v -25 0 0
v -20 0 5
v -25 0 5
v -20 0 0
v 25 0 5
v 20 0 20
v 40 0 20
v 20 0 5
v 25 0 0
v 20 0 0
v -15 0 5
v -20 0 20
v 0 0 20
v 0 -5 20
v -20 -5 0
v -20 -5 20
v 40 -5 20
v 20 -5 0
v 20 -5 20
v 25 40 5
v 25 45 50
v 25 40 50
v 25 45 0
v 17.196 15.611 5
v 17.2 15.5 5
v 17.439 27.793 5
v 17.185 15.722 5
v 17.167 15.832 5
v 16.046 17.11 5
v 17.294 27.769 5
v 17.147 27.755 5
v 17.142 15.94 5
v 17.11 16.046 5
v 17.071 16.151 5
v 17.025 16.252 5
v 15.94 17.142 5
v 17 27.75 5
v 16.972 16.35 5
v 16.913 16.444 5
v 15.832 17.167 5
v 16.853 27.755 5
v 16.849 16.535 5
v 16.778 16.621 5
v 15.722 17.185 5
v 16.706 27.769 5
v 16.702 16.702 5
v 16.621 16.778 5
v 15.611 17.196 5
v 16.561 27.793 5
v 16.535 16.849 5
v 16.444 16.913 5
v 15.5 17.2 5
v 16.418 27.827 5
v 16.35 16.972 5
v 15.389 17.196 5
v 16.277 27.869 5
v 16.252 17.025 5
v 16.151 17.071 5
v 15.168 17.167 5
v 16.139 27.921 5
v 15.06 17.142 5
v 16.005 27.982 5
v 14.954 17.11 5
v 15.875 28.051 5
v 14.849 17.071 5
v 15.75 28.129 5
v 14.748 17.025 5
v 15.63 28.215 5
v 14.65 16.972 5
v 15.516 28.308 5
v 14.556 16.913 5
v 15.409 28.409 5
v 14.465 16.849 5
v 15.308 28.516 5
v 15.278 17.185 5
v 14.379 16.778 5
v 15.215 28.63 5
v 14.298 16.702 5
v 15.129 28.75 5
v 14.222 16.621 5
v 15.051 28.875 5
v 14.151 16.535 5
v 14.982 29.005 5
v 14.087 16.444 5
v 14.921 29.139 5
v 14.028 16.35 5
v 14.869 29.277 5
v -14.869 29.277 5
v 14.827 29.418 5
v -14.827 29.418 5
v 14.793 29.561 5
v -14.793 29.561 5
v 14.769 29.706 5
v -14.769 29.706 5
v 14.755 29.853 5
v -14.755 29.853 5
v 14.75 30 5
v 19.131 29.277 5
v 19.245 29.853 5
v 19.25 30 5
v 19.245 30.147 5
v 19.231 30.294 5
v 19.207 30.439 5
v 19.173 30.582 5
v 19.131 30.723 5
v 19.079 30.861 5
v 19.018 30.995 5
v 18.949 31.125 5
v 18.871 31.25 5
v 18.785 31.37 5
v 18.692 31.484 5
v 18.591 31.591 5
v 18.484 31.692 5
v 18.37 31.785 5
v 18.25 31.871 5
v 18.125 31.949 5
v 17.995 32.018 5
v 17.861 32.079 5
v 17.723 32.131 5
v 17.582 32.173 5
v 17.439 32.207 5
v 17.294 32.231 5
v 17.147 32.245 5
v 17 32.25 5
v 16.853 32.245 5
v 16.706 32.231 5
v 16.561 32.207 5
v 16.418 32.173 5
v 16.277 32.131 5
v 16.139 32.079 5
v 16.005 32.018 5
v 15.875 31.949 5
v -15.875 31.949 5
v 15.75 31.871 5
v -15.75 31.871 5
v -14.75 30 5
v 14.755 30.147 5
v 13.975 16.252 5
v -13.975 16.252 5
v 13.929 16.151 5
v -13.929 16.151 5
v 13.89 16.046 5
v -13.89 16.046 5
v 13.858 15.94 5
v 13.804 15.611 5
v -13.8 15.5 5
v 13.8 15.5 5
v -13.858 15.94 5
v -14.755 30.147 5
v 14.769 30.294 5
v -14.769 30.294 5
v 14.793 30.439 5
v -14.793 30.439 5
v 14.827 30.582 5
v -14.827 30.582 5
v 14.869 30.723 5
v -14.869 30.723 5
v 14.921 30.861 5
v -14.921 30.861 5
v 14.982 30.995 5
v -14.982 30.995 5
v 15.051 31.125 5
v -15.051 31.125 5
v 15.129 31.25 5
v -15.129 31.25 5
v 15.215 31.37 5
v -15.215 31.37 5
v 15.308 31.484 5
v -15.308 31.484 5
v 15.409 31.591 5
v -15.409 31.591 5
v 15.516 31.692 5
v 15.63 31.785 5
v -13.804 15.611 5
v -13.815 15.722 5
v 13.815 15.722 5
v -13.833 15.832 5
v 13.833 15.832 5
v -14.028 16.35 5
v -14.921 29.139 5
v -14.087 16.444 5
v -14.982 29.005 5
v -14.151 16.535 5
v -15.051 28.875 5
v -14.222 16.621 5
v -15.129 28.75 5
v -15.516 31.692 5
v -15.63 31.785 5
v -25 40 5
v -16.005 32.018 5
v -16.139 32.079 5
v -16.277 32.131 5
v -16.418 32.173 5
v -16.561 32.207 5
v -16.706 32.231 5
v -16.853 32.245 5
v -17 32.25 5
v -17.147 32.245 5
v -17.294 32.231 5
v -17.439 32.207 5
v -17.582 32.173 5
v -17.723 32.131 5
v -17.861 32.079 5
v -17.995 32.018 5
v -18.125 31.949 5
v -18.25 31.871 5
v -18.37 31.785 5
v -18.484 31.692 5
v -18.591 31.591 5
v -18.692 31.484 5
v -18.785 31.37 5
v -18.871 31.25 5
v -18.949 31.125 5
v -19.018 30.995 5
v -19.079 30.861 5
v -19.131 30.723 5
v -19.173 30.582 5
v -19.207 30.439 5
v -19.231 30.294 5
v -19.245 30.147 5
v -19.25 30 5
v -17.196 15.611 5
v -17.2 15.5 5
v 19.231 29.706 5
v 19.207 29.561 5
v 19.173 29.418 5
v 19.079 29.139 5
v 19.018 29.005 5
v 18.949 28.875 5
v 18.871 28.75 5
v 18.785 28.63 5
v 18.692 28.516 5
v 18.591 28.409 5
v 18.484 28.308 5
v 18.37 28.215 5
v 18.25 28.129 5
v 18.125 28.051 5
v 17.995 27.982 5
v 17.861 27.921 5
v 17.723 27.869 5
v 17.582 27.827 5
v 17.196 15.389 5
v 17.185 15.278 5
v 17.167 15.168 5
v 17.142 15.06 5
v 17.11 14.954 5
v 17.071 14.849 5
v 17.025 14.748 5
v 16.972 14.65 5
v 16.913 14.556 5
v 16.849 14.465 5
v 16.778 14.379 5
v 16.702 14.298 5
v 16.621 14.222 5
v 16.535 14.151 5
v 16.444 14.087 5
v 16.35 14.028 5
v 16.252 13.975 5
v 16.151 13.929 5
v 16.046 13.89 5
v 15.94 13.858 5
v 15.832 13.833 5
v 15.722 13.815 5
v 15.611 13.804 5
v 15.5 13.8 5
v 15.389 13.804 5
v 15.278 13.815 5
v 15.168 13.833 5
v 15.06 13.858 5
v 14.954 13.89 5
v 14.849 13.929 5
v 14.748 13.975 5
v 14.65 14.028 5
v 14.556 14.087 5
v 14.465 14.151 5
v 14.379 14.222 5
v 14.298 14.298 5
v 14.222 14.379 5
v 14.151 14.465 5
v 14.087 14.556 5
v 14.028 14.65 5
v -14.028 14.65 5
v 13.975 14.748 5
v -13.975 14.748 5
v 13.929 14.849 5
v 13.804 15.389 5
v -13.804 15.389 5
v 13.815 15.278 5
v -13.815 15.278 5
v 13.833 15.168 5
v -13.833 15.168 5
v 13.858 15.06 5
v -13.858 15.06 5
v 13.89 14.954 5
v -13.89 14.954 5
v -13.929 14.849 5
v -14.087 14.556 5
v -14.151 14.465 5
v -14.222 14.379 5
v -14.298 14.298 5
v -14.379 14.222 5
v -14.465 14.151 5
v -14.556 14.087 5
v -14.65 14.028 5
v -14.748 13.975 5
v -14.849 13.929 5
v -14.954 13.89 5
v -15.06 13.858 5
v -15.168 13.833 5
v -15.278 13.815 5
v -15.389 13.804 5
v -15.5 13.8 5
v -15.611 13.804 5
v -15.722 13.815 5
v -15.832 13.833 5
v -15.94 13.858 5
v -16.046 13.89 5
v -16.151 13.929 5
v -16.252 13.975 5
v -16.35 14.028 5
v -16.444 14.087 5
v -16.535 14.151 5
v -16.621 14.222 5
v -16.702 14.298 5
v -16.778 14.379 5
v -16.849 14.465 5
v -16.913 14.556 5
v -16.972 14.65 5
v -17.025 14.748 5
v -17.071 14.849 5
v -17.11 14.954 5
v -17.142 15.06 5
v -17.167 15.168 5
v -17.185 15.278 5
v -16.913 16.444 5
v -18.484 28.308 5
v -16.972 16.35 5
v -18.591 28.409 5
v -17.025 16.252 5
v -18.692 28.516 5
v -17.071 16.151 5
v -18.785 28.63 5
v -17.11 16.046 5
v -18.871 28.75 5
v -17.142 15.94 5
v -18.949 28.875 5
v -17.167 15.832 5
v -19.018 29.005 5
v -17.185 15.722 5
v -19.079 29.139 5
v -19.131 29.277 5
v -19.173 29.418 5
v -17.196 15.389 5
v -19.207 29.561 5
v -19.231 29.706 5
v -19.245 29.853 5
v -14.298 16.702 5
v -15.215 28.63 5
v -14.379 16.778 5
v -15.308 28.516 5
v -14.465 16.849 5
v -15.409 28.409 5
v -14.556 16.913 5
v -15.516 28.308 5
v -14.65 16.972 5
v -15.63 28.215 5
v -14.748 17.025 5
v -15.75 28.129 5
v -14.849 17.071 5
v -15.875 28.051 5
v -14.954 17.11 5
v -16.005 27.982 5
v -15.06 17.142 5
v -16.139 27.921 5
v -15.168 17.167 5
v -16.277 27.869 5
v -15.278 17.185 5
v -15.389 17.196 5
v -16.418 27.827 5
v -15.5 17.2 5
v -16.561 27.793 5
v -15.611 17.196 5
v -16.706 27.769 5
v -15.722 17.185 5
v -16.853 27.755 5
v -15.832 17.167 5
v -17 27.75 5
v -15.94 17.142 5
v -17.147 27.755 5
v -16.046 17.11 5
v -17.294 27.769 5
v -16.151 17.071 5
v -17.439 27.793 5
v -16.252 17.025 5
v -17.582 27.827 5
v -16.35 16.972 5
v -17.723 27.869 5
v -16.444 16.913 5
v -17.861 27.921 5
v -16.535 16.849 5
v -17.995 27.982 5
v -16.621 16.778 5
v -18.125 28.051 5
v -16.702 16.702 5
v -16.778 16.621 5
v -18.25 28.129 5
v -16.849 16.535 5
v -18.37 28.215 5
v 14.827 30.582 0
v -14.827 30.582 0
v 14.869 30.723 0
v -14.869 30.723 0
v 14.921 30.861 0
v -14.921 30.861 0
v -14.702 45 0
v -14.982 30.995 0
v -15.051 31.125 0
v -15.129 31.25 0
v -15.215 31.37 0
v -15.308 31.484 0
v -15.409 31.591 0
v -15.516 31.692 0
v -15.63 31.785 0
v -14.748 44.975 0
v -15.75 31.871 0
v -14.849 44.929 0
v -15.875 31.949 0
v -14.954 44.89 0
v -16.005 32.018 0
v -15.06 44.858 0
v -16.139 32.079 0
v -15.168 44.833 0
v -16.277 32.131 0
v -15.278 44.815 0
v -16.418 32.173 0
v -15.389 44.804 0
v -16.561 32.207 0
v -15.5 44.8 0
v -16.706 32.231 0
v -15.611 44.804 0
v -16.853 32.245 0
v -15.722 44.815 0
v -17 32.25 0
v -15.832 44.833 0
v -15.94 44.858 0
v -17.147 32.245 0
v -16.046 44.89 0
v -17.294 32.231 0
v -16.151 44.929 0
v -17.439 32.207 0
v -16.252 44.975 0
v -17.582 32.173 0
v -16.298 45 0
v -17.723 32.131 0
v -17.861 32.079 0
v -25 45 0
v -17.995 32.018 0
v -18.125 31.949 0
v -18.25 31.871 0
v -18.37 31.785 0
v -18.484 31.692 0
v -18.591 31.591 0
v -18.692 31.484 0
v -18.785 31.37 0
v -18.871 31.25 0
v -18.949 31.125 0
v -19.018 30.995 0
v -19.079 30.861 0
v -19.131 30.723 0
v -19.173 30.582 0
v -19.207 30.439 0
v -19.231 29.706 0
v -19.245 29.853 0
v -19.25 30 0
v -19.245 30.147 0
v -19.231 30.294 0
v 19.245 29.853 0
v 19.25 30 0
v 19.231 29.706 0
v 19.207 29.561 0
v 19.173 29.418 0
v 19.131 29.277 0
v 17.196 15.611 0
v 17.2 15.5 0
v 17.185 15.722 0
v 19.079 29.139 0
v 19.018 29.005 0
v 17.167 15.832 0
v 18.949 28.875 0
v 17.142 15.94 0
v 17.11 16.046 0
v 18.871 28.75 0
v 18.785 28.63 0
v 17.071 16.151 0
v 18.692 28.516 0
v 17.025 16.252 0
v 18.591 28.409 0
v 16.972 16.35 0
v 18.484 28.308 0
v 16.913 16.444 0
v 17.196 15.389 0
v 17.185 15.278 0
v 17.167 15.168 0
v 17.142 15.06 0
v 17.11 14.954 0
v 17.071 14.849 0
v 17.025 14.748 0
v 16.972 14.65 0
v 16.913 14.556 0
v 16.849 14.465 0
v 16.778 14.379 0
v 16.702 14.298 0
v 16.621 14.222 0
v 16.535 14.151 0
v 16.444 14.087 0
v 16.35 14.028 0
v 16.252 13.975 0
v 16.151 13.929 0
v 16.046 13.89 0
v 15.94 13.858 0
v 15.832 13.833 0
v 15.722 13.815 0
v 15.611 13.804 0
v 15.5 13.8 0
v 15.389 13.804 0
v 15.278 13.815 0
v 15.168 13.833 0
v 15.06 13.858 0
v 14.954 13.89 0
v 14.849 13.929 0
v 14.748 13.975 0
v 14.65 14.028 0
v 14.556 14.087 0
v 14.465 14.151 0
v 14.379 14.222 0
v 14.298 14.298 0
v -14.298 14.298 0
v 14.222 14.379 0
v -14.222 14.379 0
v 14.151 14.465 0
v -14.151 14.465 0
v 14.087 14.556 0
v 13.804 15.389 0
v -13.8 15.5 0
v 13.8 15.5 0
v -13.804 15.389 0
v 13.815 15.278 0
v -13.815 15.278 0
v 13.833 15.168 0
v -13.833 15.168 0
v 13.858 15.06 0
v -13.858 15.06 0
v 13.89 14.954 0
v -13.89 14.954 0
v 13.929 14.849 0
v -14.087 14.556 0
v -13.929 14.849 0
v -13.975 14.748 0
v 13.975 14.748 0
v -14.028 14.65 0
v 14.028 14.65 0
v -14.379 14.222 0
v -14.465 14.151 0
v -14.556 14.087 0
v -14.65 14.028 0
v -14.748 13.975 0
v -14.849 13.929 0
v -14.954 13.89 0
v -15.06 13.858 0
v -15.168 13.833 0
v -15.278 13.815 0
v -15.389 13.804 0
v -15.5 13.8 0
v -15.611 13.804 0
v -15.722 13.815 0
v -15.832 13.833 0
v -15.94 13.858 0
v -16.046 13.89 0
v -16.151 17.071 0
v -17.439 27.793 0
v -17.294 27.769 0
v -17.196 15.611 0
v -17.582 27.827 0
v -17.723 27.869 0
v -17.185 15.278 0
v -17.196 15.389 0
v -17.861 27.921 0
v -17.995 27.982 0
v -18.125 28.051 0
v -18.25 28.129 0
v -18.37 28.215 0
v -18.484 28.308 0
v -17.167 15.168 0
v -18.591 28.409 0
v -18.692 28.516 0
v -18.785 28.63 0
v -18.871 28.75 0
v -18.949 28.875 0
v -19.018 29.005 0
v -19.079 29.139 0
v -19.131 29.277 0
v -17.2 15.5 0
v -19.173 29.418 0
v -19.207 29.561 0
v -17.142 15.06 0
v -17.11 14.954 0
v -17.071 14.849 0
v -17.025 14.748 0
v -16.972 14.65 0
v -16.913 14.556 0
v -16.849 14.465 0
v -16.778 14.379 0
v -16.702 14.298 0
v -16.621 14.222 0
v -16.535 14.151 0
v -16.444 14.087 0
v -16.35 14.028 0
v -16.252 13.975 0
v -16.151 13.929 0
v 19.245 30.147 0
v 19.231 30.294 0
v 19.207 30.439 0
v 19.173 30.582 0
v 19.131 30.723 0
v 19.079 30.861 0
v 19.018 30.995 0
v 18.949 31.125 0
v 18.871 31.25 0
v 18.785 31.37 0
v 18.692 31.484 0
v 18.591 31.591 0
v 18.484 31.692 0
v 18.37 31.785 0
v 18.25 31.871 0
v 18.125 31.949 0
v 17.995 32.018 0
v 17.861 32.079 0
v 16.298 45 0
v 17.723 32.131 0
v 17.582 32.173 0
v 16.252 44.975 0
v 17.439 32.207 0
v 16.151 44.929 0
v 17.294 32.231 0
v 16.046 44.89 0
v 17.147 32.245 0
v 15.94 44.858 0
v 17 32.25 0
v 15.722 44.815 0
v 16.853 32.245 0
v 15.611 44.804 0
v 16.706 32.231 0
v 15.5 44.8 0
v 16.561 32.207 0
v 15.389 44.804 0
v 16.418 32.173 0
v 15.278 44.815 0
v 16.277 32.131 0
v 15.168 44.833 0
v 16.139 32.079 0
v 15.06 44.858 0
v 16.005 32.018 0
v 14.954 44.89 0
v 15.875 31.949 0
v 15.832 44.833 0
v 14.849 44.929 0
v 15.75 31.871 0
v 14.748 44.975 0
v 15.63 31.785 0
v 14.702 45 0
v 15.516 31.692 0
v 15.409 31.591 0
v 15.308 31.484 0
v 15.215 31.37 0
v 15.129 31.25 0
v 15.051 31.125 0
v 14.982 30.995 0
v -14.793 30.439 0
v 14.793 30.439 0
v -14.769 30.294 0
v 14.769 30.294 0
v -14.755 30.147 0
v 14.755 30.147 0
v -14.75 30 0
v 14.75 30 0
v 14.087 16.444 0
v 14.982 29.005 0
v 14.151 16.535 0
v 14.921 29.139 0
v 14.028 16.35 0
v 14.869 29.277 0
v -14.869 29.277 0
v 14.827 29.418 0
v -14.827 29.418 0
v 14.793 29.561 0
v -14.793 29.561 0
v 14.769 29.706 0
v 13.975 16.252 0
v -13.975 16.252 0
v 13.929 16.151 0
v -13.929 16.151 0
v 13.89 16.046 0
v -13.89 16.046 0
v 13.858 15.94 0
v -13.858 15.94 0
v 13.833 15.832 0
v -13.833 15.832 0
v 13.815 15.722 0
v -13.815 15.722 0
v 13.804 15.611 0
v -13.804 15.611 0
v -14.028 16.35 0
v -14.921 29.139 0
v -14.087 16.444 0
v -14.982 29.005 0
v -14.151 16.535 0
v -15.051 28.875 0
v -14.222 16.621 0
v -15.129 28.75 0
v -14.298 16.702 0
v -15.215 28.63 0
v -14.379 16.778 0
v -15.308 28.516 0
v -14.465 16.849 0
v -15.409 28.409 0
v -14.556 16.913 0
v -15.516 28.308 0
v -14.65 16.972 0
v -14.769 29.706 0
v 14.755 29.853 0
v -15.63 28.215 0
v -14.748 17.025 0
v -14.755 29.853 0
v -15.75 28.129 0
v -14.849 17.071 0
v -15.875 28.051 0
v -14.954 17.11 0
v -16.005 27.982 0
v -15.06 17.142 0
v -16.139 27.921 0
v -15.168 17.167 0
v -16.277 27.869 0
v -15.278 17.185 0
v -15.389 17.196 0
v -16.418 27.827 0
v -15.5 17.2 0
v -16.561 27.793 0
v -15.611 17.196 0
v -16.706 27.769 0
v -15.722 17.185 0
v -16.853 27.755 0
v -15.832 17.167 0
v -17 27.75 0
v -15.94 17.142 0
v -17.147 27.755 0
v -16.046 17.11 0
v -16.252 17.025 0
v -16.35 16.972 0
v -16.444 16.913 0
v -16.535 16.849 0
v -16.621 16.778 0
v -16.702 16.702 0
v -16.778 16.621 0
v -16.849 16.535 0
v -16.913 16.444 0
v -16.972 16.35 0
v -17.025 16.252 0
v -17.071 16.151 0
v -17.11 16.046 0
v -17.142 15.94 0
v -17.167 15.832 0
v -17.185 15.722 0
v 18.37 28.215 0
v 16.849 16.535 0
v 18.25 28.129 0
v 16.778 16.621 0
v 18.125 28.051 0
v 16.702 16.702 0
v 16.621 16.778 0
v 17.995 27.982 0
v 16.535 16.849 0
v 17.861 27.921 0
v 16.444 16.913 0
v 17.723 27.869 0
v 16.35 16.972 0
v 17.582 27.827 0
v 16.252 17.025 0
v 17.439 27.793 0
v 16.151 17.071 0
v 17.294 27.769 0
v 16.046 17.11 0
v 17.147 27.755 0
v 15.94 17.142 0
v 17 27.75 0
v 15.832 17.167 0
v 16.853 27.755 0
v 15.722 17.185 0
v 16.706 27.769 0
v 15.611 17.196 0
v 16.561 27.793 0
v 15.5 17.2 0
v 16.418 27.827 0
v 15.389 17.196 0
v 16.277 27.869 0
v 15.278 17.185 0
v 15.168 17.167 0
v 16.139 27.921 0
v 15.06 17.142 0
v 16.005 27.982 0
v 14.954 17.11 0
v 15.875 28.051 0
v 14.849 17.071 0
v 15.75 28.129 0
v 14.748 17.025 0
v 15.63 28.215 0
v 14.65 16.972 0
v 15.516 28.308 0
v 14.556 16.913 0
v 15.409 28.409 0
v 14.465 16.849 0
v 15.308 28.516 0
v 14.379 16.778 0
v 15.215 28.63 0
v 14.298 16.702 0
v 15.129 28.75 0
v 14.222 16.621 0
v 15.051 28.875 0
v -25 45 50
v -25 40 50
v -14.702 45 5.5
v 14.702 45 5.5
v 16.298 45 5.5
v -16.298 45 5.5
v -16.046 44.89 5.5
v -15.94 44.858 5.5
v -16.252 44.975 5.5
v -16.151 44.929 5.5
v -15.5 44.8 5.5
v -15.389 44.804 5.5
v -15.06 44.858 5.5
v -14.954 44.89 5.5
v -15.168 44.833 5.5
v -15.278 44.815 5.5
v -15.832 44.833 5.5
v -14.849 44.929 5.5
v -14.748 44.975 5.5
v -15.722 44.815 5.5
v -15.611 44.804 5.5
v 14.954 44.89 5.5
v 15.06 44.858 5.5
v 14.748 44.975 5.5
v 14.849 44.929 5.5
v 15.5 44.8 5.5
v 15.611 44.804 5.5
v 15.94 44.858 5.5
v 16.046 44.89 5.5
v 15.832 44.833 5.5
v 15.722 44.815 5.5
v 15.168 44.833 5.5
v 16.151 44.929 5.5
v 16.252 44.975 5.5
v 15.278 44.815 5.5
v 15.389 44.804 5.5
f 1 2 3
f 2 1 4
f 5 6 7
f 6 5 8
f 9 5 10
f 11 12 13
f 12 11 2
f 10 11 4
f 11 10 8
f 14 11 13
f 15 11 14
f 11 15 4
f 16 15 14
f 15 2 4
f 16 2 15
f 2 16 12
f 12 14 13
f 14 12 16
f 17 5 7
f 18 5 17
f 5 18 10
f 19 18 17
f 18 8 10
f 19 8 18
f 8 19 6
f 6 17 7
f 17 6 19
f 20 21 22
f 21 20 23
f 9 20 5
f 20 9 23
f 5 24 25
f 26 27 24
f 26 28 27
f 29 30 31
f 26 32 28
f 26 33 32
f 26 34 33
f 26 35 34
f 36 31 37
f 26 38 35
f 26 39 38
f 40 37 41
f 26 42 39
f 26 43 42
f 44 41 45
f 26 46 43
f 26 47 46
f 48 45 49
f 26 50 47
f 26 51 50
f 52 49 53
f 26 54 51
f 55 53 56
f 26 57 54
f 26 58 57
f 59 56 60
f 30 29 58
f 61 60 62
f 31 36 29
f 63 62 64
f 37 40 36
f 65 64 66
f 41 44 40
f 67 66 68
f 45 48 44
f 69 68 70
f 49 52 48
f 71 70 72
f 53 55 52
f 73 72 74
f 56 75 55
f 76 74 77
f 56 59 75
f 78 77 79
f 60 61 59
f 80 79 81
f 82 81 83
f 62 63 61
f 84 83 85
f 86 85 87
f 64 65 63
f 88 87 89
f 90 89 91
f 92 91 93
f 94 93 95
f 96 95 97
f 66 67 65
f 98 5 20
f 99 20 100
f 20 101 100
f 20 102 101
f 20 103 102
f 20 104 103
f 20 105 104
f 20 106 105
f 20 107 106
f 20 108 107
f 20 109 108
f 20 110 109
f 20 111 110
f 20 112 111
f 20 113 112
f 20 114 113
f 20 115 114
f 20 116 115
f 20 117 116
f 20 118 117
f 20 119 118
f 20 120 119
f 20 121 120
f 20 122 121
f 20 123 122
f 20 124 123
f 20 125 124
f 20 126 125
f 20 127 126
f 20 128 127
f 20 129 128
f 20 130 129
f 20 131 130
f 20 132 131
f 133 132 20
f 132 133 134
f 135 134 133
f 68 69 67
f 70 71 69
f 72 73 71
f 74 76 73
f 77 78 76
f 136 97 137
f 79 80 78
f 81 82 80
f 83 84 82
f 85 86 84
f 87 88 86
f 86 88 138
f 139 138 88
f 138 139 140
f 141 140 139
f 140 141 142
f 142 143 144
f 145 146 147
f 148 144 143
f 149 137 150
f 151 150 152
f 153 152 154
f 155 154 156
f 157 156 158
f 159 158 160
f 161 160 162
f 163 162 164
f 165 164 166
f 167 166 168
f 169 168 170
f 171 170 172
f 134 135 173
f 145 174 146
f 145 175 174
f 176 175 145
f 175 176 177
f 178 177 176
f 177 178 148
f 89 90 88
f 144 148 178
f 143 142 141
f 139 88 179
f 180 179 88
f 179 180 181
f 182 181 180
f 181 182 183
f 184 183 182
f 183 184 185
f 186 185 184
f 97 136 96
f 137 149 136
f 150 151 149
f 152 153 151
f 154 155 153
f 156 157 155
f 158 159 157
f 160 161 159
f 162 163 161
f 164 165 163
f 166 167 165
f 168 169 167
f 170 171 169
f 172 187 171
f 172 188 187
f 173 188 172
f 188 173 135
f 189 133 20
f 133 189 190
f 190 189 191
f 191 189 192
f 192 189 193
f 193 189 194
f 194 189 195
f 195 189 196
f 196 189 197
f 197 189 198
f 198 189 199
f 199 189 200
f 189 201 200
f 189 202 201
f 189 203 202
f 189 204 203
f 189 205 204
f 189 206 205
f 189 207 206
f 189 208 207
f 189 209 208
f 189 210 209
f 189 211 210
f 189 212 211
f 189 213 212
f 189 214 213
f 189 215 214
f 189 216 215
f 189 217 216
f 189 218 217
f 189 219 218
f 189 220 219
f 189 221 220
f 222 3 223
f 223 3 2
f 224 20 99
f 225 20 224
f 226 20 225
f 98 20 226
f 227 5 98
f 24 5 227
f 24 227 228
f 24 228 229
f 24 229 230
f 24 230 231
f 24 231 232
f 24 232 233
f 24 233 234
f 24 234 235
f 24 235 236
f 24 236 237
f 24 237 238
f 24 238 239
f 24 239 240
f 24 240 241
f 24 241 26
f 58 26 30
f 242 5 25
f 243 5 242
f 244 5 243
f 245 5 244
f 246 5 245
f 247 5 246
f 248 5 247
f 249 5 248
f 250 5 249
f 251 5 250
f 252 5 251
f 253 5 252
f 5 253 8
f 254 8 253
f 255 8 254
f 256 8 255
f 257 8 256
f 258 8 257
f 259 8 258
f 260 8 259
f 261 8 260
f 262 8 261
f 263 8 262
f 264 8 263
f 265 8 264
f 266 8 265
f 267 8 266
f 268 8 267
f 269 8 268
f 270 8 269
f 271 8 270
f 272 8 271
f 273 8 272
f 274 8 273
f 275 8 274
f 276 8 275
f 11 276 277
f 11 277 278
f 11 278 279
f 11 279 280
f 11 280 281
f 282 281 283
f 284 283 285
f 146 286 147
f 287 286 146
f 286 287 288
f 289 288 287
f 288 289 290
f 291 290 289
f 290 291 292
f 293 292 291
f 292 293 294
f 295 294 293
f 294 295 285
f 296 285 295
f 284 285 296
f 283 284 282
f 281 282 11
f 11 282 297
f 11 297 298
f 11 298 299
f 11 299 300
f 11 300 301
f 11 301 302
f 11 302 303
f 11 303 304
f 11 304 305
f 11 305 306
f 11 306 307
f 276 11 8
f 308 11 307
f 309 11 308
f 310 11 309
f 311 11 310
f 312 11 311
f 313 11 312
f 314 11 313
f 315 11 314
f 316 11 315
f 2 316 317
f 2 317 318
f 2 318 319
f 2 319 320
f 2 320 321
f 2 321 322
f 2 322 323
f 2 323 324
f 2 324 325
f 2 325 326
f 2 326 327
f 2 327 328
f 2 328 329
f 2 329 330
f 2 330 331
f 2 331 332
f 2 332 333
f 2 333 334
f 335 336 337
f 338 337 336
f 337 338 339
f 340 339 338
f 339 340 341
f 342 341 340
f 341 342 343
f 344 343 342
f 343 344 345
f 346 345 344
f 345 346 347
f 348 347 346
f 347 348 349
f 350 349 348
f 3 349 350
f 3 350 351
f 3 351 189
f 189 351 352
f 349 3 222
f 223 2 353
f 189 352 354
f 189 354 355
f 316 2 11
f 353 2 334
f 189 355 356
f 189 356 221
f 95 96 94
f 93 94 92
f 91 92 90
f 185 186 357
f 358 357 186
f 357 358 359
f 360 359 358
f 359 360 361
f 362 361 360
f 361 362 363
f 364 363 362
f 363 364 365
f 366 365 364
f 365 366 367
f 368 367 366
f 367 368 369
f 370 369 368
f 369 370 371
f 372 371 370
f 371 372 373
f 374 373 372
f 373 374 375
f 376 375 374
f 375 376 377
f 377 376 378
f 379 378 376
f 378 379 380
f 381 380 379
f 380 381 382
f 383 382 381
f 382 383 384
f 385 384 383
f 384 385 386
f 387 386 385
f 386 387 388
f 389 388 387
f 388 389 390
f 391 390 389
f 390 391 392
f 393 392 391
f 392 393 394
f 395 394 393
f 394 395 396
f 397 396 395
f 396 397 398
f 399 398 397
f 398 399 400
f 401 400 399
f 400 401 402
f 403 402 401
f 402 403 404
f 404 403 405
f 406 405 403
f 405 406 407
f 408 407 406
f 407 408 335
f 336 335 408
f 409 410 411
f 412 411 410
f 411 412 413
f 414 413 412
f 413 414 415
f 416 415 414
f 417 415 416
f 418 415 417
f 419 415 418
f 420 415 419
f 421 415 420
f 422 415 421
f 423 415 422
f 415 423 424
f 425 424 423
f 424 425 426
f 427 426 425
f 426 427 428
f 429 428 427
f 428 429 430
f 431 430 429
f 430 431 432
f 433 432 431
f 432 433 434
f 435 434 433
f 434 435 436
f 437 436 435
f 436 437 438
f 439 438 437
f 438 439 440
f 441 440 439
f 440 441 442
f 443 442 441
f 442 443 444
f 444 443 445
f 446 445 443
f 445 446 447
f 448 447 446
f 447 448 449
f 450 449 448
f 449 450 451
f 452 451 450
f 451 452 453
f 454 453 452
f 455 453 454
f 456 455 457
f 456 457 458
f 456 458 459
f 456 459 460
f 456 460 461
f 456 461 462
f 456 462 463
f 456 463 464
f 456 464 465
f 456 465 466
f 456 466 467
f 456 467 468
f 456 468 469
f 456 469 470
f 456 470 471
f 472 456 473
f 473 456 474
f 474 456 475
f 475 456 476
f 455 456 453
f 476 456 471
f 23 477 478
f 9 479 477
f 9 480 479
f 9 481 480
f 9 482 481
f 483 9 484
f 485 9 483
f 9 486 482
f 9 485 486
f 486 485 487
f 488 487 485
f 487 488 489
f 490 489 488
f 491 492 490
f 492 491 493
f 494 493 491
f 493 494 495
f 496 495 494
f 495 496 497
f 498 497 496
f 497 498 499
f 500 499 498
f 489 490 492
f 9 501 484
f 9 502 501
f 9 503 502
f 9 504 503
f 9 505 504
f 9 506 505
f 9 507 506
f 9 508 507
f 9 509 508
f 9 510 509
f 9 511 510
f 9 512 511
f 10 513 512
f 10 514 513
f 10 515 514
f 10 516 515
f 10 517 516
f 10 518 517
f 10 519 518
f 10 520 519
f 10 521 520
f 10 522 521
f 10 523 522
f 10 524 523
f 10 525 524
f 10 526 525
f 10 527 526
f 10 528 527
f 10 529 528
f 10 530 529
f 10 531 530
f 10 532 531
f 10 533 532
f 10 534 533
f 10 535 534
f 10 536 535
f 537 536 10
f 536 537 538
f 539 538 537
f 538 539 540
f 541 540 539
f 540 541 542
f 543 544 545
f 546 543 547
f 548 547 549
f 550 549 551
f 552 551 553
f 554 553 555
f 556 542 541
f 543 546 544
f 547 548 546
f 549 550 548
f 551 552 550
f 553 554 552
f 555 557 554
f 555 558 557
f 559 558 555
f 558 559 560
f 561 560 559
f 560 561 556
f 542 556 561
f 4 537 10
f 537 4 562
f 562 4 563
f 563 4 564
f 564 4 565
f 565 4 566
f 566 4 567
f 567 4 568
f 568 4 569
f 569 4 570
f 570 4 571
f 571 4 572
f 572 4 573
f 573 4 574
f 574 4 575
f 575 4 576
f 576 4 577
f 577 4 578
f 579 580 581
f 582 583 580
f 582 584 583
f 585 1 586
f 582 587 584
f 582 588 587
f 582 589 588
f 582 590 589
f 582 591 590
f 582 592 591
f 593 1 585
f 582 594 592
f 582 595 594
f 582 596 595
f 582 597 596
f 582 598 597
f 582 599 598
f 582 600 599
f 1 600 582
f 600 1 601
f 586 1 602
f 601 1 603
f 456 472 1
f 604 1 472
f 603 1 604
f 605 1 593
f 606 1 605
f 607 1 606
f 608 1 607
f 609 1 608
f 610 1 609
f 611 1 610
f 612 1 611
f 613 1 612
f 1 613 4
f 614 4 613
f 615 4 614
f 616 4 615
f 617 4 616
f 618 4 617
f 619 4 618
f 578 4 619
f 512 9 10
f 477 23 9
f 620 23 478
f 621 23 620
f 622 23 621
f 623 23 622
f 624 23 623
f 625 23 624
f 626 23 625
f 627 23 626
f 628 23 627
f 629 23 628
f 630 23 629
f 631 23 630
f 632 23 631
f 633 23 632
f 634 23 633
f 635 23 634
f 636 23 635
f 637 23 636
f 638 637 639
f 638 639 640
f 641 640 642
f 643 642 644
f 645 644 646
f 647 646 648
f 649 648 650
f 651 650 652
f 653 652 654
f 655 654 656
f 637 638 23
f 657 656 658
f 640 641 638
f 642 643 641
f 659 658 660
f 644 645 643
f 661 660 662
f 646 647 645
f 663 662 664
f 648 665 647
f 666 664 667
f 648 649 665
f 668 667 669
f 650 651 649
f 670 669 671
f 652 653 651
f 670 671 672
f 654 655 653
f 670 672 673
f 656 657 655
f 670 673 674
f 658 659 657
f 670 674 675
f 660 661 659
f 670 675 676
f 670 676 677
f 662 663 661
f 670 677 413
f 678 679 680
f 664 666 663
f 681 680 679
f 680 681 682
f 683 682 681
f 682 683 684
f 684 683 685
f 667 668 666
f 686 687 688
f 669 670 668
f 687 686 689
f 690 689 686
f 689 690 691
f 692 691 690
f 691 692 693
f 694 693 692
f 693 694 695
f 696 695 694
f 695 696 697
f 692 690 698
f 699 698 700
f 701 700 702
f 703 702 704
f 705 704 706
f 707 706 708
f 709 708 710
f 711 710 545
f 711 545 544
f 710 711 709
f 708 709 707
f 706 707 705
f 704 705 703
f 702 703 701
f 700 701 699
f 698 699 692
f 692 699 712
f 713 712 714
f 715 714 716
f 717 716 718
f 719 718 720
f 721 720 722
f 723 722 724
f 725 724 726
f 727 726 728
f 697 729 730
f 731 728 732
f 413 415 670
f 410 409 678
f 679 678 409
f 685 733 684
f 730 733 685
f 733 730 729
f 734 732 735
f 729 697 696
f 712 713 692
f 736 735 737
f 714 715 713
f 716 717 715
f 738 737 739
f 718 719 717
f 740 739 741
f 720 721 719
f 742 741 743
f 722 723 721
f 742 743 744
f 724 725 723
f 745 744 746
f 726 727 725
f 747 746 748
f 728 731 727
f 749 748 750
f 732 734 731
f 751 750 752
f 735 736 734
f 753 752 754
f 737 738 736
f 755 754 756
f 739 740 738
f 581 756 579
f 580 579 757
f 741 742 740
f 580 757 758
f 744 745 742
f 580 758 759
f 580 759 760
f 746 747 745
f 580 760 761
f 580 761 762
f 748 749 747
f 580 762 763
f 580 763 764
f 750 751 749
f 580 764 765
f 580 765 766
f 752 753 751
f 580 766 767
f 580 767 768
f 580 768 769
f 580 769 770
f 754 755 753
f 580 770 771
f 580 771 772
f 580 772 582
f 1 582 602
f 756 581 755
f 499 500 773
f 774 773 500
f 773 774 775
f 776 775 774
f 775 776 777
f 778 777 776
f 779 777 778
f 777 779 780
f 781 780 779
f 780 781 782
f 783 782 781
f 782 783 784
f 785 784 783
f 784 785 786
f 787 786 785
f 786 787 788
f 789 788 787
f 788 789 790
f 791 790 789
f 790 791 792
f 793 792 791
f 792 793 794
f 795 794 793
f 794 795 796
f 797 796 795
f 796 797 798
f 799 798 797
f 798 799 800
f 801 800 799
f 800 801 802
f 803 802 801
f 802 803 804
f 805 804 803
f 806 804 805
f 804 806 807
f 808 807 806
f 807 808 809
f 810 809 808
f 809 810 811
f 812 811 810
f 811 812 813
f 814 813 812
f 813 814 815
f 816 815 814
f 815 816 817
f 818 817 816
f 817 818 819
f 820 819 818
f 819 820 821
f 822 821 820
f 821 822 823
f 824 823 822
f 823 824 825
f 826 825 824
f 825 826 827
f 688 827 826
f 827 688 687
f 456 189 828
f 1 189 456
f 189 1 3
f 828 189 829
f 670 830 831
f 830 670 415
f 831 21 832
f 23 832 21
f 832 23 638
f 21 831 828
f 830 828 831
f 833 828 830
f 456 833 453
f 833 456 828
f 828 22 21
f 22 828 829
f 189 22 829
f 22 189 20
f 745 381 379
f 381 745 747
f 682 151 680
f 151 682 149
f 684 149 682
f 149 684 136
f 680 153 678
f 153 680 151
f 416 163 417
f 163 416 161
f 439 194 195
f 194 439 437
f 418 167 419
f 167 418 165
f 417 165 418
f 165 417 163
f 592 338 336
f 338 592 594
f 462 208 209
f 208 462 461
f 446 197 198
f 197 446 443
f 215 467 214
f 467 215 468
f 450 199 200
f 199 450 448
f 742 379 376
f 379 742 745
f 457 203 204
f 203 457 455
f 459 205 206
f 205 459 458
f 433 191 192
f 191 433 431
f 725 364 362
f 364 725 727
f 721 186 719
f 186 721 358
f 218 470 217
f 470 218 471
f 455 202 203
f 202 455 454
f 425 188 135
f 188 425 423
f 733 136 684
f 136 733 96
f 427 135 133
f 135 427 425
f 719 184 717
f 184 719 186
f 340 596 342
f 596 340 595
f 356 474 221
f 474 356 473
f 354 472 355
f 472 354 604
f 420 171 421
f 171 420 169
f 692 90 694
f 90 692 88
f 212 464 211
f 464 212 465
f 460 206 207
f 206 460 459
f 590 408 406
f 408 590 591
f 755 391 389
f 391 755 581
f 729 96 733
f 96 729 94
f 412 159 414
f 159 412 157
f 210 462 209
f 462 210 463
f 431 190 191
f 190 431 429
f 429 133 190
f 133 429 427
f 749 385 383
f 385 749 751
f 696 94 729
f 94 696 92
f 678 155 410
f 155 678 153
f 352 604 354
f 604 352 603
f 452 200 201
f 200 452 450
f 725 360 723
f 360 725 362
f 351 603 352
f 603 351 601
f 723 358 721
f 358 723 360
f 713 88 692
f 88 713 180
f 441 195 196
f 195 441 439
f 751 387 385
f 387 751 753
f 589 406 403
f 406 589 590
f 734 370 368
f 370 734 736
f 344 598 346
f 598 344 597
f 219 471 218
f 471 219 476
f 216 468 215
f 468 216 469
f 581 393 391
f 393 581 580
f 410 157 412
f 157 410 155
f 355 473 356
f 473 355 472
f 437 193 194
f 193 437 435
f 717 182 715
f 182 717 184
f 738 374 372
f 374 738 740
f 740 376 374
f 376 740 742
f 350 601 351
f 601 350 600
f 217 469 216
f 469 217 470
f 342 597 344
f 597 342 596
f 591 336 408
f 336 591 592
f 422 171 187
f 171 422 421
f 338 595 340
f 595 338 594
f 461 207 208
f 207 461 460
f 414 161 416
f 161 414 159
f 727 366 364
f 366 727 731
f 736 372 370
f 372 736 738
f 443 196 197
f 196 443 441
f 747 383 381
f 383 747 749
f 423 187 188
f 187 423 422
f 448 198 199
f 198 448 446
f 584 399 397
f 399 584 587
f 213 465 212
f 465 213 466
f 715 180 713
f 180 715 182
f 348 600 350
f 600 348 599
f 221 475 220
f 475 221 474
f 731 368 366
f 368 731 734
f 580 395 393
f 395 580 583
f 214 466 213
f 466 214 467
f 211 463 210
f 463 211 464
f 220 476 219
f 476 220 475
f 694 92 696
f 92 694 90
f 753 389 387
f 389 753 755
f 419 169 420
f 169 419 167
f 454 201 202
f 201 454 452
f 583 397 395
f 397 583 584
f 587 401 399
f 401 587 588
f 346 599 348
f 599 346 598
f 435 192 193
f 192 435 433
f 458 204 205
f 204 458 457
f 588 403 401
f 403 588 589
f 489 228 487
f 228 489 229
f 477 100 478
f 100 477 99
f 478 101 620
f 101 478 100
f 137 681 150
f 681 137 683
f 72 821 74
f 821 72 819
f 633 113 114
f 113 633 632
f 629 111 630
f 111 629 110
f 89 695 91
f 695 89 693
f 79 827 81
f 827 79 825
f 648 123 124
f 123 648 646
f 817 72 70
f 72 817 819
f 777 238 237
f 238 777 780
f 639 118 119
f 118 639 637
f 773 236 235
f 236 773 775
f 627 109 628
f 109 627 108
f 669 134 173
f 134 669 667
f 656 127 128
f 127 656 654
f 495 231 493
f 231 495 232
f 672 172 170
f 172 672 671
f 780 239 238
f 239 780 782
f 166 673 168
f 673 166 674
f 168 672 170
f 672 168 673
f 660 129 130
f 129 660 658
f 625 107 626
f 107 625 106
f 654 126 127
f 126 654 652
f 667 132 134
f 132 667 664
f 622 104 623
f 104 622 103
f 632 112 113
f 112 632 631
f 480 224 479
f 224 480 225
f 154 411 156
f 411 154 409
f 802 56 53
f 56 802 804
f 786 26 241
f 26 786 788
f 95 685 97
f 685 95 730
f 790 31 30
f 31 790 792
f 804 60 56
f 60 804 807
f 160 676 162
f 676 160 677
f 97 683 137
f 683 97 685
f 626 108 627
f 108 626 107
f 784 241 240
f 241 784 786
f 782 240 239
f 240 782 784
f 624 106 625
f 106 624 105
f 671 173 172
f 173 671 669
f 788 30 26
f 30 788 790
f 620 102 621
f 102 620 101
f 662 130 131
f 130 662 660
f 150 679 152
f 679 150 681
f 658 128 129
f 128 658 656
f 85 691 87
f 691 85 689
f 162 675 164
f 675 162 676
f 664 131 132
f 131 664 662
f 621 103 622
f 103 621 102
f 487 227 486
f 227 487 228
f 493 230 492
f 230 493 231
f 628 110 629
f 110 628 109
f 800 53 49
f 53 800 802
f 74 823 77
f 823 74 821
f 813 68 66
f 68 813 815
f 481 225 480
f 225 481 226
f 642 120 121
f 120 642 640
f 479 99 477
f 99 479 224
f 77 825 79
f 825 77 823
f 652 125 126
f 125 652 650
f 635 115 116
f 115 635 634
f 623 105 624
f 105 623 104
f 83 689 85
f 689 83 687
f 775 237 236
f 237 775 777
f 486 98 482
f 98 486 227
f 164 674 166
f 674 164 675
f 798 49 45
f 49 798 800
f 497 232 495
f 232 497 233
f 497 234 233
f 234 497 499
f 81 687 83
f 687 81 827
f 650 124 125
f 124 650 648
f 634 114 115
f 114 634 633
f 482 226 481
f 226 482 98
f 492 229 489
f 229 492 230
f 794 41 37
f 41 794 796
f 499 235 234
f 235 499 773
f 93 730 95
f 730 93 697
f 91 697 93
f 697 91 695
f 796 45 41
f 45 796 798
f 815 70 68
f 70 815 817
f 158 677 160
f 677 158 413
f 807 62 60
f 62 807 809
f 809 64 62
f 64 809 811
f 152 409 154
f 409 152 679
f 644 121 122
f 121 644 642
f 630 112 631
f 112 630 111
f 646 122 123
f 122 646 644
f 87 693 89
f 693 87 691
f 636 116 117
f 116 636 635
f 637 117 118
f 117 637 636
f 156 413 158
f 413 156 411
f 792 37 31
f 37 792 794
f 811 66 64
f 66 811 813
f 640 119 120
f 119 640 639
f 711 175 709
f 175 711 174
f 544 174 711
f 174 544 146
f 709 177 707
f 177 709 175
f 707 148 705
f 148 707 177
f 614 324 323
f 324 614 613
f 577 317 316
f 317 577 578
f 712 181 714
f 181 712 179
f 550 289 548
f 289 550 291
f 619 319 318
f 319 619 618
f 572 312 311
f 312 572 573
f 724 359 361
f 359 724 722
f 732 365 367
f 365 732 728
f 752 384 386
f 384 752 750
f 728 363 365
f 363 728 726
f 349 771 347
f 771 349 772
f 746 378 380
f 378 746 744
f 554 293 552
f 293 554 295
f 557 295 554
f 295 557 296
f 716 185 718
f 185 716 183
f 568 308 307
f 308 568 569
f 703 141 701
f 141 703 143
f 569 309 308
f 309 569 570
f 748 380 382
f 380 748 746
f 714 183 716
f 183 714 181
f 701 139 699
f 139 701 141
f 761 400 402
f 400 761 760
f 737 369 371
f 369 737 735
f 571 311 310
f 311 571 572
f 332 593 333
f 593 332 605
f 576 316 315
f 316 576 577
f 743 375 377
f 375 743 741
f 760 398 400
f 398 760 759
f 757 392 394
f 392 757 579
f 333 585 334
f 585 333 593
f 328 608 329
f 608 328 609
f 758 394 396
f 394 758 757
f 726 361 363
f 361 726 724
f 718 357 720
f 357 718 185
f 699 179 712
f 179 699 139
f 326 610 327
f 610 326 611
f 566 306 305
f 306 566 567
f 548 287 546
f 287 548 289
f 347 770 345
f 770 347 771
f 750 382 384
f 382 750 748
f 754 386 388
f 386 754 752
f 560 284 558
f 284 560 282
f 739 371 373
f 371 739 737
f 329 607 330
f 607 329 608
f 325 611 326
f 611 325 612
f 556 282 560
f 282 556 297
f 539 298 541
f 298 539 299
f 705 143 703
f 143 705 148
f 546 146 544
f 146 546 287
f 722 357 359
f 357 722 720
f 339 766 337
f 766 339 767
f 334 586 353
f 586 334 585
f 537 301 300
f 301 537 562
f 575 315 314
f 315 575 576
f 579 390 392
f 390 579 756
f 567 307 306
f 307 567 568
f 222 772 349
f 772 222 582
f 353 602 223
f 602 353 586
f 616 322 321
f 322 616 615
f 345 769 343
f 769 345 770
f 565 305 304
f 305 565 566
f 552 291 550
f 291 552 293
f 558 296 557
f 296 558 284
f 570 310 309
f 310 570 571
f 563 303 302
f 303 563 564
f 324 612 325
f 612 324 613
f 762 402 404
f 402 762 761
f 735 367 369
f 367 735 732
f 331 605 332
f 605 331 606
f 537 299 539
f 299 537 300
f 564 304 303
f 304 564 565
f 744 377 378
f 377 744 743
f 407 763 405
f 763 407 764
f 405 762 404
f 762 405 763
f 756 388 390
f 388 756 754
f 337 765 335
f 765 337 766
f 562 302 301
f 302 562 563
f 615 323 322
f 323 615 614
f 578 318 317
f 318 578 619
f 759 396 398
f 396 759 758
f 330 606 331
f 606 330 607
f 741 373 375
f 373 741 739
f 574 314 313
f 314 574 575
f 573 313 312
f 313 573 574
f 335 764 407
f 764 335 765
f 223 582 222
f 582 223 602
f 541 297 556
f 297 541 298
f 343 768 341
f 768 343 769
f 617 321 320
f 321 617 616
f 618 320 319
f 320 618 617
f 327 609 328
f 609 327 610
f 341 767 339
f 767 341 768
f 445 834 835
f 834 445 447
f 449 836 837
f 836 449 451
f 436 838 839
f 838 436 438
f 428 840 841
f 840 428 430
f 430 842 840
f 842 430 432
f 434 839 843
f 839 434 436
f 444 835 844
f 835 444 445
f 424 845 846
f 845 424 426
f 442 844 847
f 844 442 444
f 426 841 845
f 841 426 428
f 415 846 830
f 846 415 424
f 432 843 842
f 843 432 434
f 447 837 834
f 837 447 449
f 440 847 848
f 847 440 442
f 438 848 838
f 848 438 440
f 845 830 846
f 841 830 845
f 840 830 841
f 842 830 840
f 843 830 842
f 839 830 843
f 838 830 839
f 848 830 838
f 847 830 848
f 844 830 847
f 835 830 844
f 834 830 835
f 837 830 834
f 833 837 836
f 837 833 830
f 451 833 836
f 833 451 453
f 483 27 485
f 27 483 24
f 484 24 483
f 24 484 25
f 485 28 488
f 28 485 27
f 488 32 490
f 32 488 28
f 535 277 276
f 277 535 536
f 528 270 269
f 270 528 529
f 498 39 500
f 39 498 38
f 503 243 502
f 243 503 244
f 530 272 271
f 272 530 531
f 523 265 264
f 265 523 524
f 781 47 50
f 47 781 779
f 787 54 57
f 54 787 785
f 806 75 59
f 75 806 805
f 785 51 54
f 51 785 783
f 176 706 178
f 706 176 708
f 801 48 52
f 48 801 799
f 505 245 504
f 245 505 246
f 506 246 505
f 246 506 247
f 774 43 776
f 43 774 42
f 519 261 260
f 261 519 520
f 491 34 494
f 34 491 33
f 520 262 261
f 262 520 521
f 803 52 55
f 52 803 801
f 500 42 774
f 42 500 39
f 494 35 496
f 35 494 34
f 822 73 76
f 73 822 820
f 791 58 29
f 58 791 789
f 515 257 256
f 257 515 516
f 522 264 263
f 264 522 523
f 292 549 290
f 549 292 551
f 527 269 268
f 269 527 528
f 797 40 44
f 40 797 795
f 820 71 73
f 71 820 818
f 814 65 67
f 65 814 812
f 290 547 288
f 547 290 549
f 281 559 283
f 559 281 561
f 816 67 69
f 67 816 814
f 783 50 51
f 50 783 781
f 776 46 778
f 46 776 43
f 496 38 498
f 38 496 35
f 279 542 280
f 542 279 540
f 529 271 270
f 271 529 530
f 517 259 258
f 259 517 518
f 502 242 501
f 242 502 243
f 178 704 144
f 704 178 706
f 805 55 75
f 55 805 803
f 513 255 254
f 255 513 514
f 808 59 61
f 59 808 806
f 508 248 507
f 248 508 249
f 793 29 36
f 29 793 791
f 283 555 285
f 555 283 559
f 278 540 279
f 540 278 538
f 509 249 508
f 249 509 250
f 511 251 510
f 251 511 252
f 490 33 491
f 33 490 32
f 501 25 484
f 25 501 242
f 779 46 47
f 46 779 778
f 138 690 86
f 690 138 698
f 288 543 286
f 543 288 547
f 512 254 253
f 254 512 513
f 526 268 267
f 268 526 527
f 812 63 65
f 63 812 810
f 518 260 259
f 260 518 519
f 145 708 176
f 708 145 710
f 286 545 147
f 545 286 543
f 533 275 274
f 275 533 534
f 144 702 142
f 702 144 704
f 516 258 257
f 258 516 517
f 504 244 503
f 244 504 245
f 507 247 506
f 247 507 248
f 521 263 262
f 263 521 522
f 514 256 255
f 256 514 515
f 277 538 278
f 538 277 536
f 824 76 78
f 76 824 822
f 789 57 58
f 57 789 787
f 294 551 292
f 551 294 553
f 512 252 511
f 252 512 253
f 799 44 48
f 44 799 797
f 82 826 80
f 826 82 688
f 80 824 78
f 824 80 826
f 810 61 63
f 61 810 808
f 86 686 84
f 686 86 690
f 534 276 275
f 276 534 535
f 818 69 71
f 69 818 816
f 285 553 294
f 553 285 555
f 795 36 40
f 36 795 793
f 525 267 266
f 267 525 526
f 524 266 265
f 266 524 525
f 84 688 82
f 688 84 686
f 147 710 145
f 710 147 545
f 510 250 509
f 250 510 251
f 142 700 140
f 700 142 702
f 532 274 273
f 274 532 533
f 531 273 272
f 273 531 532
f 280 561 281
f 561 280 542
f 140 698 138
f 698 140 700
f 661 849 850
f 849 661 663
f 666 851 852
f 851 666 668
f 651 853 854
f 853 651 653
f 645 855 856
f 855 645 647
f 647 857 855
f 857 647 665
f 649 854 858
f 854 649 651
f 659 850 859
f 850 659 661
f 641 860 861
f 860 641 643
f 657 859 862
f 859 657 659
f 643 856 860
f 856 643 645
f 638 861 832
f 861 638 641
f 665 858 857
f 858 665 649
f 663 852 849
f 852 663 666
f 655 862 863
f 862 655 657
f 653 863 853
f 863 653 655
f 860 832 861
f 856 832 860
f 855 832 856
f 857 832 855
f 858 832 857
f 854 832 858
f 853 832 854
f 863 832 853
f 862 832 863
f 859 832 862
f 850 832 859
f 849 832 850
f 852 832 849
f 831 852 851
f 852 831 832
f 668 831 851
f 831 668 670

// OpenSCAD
// L-shaped mounting bracket for a NEMA 17 stepper motor
// Print orientation: base plate on the bed (z = 0), motor plate builds upward (+Z)

// ---------------- Parameters ----------------
base_x       = 25;    // base plate half-width (X)
base_y       = 45;    // base plate length (Y)
base_z       = 5;     // base plate thickness (Z)

motor_x      = 25;    // motor plate half-width (X)
motor_y      = 5;     // motor plate thickness (Y)
motor_h      = 50;    // motor plate height (Z)

boss_d       = 23;    // motor centring boss hole diameter
boss_x       = 0;     // boss hole centre X
boss_z       = 28;    // boss hole centre Z

screw_d      = 3.4;   // M3 screw hole diameter
screw_p      = 31;    // square pattern side length
screw_n      = 4;     // number of screw holes

gusset_t     = 5;     // gusset thickness (X)
gusset_y     = 20;    // gusset leg along +Y
gusset_z     = 20;    // gusset leg along +Z

eps          = 0.5;   // cutter overshoot past faces
$fn          = 96;    // curve resolution

// ---------------- Model ----------------
difference() {
    union() {
        // Base plate: x -25..25, y 0..45, z 0..5
        translate([-base_x, 0, 0])
            cube([2 * base_x, base_y, base_z]);

        // Motor plate: x -25..25, y 0..5, z 0..50 (standing on back edge)
        translate([-motor_x, base_y - motor_y, 0])
            cube([2 * motor_x, motor_y, motor_h]);

        // Gussets: right triangles in YZ, extruded along X, flush with plate edges
        for (sx = [-1, 1])
            translate([sx * (motor_x - gusset_t), 0, 0])
                rotate([90, 0, 0])
                    linear_extrude(height = gusset_t)
                        polygon(points = [
                            [gusset_y, gusset_z],
                            [0,        gusset_z],
                            [0,        0]
                        ]);
    }

    // Base plate through-holes (M4) at (-17, 30) and (17, 30)
    for (hx = [-17, 17])
        translate([hx, 30, -eps])
            cylinder(d = 4.5, h = base_z + 2 * eps);

    // Boss hole along Y, centred at (0, 28)
    translate([boss_x, 0, boss_z])
        rotate([0, 90, 0])
            cylinder(d = boss_d, h = motor_y + 2 * eps);

    // M3 screw holes on a 31 mm square pattern, centred on the boss hole
    for (i = [0 : screw_n - 1])
        for (j = [0 : screw_n - 1])
            translate([(i - (screw_n - 1) / 2) * screw_p,
                       (j - (screw_n - 1) / 2) * screw_p,
                       -eps])
                cylinder(d = screw_d, h = motor_y + 2 * eps);
}
